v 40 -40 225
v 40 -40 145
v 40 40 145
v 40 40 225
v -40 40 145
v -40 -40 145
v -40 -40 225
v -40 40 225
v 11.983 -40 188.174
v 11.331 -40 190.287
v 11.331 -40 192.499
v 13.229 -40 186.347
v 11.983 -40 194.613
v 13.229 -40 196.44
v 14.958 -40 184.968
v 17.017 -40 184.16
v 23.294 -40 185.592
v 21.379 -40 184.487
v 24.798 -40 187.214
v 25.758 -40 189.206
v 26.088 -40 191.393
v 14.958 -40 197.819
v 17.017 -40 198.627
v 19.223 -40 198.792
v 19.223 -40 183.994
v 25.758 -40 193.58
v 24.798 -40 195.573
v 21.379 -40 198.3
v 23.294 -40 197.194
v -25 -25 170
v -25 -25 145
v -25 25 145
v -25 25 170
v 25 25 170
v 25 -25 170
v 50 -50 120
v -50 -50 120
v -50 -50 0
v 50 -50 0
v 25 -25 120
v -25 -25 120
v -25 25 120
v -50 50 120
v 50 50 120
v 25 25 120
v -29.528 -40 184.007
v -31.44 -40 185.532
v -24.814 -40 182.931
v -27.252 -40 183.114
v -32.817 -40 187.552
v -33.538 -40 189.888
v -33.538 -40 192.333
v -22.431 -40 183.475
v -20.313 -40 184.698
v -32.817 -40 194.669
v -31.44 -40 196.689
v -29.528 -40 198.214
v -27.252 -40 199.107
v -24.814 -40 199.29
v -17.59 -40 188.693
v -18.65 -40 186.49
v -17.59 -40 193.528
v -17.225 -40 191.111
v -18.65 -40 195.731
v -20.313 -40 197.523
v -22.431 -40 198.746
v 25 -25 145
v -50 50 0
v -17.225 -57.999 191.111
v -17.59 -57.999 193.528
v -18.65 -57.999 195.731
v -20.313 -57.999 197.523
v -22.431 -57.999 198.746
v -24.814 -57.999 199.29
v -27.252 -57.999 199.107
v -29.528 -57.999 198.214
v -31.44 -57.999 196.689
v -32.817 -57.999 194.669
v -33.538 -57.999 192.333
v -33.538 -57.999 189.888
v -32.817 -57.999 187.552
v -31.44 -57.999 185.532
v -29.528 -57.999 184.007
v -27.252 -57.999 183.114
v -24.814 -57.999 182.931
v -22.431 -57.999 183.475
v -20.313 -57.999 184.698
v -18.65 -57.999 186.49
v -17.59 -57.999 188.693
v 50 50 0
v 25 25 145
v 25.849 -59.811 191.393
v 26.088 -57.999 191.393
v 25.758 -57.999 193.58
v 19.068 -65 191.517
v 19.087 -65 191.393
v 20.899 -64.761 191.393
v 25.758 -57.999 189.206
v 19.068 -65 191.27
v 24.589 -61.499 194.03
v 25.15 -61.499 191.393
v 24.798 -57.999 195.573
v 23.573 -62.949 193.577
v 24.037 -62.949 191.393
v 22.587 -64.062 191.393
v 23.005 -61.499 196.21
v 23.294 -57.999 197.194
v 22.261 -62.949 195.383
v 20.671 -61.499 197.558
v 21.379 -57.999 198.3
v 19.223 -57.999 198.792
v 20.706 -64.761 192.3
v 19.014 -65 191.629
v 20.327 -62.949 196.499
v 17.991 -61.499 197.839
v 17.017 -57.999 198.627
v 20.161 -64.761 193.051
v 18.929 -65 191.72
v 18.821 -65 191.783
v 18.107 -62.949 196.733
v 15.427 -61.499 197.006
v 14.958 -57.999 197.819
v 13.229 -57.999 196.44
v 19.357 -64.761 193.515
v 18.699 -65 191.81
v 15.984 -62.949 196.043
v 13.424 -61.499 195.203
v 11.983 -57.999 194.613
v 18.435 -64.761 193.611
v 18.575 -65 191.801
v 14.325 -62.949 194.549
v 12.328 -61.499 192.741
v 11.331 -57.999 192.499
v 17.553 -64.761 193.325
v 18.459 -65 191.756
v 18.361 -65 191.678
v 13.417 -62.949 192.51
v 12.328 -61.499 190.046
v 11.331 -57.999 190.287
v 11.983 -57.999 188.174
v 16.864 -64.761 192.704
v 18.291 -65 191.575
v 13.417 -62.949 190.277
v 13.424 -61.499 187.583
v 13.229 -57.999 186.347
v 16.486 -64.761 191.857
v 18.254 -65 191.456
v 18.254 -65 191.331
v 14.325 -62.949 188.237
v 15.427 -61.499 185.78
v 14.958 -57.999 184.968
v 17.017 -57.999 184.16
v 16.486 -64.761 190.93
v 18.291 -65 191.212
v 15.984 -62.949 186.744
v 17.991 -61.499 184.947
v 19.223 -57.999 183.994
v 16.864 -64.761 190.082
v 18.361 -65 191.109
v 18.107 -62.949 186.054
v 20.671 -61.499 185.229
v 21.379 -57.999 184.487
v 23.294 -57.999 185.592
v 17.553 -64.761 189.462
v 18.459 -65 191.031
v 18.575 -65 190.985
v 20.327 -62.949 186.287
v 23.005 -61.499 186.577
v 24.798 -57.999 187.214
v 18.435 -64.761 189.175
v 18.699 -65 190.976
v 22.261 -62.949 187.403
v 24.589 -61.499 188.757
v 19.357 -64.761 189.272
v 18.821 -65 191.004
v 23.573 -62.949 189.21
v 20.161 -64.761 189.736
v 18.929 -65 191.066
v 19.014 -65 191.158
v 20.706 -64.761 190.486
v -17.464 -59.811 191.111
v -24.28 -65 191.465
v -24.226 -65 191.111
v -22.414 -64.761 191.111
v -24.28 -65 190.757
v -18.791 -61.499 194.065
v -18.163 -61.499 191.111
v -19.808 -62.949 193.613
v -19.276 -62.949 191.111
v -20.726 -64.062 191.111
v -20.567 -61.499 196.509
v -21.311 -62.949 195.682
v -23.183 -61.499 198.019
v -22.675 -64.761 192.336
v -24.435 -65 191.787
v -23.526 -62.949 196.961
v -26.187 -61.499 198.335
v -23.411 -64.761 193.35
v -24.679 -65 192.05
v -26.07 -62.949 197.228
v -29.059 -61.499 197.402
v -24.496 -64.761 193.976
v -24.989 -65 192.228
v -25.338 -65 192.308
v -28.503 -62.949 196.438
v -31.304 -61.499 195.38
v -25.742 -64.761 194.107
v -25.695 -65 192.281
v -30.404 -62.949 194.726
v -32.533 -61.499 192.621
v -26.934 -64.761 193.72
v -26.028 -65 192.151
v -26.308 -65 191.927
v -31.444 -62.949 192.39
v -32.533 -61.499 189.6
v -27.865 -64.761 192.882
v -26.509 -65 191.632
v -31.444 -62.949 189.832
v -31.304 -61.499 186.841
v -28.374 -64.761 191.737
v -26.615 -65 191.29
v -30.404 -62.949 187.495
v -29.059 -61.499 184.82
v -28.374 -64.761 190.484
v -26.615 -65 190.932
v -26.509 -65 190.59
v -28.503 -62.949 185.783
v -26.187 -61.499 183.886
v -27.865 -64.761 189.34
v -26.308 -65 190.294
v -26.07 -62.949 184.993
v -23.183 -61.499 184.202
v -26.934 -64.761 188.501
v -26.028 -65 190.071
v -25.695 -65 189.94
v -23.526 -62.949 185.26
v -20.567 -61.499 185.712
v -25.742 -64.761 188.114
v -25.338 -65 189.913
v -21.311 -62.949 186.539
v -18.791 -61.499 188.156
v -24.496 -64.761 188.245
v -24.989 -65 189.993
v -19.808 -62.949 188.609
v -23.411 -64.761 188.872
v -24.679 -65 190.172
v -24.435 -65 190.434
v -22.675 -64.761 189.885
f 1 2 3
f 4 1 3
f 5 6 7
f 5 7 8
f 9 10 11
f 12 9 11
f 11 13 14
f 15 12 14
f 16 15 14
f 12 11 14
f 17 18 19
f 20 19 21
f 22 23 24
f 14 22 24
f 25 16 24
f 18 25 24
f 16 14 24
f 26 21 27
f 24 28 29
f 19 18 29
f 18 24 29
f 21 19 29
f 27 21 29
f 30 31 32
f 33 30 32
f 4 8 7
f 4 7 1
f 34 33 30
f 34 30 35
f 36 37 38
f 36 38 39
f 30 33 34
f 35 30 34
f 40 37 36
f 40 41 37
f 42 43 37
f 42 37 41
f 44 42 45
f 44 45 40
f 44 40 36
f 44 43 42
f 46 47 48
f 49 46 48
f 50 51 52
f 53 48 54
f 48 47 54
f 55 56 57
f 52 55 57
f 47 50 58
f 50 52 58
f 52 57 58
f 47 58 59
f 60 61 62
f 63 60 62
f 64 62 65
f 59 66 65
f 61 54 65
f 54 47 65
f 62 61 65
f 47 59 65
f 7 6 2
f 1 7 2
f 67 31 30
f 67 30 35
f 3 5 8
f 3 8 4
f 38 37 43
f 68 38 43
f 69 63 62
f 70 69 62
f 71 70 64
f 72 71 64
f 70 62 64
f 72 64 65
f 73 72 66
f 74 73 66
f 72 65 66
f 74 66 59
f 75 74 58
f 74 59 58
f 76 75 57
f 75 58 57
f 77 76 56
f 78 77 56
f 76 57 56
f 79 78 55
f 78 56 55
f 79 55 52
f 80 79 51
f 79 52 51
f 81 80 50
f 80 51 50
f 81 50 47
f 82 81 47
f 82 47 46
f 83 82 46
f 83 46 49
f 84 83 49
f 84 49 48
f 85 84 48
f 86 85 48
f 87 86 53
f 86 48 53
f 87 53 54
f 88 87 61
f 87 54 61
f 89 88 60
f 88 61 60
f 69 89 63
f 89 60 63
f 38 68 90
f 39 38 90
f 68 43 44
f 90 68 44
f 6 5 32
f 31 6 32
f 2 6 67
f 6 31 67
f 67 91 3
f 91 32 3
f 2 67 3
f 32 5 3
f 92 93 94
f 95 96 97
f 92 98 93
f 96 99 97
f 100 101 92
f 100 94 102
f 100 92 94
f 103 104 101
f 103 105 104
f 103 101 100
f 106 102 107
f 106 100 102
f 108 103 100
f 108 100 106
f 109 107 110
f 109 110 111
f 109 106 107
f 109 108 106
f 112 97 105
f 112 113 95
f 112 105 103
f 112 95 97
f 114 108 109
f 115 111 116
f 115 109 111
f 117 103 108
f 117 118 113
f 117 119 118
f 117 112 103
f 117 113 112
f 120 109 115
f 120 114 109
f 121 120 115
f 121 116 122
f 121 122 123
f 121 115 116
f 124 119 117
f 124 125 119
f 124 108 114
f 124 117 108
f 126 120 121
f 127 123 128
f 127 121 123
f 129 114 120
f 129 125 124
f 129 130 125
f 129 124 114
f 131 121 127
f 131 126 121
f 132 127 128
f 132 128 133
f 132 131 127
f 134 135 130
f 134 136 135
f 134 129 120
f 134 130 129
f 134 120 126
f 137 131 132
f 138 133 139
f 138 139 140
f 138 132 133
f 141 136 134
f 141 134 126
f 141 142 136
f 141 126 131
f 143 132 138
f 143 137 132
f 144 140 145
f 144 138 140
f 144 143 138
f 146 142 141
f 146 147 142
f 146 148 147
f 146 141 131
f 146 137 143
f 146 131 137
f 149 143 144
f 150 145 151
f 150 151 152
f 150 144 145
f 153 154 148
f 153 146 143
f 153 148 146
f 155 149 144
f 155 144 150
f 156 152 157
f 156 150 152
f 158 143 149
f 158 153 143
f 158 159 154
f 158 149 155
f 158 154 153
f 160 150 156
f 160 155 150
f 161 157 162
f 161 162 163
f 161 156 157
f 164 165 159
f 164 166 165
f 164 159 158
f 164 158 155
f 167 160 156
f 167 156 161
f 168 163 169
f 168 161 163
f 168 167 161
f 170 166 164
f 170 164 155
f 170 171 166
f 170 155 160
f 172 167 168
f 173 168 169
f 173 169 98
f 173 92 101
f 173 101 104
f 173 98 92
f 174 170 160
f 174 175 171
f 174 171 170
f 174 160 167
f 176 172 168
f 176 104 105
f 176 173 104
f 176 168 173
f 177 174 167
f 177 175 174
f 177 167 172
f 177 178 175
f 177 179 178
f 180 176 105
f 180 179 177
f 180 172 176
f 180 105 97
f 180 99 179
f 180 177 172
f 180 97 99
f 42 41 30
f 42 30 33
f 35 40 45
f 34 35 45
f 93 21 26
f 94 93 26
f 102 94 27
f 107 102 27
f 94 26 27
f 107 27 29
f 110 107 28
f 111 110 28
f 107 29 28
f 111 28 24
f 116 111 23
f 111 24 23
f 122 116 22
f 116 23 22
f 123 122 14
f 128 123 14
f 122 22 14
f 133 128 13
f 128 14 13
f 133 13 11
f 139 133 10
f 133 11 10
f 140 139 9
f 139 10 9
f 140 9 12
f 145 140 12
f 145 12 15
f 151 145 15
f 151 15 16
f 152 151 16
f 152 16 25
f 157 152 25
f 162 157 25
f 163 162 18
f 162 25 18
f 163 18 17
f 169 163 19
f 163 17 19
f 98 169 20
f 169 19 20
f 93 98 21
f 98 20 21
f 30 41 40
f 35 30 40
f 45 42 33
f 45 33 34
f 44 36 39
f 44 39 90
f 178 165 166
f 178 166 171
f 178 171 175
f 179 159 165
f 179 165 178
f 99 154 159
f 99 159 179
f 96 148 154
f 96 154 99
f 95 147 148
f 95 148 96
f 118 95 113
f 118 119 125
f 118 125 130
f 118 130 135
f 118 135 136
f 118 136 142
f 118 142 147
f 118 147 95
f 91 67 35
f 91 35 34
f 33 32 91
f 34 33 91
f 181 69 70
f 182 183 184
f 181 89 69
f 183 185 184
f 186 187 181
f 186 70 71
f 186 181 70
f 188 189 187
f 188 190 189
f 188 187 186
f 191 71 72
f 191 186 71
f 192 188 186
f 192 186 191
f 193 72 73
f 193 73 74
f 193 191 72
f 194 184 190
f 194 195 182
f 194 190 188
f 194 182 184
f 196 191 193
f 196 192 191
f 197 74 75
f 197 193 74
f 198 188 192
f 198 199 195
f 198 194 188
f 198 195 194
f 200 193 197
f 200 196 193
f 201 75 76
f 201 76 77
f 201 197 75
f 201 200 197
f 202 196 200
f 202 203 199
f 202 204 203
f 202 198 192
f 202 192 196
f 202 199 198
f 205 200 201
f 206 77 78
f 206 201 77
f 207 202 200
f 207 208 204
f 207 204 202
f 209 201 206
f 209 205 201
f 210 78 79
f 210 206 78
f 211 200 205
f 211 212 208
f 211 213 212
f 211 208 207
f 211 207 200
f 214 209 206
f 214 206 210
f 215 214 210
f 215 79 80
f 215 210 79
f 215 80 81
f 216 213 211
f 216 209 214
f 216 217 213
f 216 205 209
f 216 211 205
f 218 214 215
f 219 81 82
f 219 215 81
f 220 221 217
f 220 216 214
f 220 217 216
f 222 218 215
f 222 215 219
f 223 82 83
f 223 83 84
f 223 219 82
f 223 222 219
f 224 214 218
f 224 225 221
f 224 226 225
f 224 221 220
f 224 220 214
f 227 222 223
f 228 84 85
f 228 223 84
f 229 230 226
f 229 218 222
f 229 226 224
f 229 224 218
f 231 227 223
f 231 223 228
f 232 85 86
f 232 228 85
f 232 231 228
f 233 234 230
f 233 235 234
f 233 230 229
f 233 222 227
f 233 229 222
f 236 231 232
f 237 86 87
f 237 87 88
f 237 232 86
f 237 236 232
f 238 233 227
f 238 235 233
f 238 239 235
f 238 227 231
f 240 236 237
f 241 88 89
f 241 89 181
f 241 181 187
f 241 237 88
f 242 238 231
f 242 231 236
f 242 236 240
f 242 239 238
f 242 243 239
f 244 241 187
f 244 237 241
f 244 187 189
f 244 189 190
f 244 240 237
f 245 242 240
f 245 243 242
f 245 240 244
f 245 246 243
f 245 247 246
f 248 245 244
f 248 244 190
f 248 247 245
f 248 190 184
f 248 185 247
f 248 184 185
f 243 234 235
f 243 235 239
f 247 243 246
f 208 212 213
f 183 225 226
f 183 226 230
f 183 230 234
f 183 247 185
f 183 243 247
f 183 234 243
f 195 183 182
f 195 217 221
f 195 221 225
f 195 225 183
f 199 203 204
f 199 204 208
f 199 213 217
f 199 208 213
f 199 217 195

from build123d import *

# Parameters (mm, degrees)
F0_W     = 100
F0_H     = 100
F1_DEPTH = 120
F2_W     = 50
F2_H     = 50
F3_DEPTH = 50
F5_W     = 80
F5_H     = 80
F6_DEPTH = 80
F8_R     = 8.202105
F8_R_2   = 7.419571
F9_DEPTH = 25
F10_R    = 7.001219


with BuildPart() as f1:
    # F0 (on Top) → F1 (new body)
    with BuildSketch(Plane.XY):
        Rectangle(F0_W, F0_H)
    extrude(amount=F1_DEPTH)

    # F2 (on face) → F3 (join)
    with BuildSketch(Plane.XY.offset(120)):
        Rectangle(F2_W, F2_H)
    extrude(amount=F3_DEPTH)


with BuildPart() as f6:
    # F5 (on offset) → F6 (new body)
    with BuildSketch(Plane.XY.offset(145)):
        Rectangle(F5_W, F5_H)
    extrude(amount=F6_DEPTH)

    # F7: cut F1
    add(f1.part, mode=Mode.SUBTRACT)


with BuildPart() as f9:
    # F8 (on face) → F9 (new body)
    with BuildSketch(Plane.XZ.offset(40)):
        with Locations((-25.427306, 191.110611)):
            Circle(F8_R)
        with Locations((18.668158, 191.393271)):
            Circle(F8_R_2)
    extrude(amount=F9_DEPTH)

    # F10
    f10_edges = [f9.edges().sort_by_distance(p)[0] for p in [
        (-33.629411, -65, 191.110611),
        (11.248587, -65, 191.393271),
    ]]
    fillet(f10_edges, radius=F10_R)


solid = Compound([f1.part, f6.part, f9.part])
